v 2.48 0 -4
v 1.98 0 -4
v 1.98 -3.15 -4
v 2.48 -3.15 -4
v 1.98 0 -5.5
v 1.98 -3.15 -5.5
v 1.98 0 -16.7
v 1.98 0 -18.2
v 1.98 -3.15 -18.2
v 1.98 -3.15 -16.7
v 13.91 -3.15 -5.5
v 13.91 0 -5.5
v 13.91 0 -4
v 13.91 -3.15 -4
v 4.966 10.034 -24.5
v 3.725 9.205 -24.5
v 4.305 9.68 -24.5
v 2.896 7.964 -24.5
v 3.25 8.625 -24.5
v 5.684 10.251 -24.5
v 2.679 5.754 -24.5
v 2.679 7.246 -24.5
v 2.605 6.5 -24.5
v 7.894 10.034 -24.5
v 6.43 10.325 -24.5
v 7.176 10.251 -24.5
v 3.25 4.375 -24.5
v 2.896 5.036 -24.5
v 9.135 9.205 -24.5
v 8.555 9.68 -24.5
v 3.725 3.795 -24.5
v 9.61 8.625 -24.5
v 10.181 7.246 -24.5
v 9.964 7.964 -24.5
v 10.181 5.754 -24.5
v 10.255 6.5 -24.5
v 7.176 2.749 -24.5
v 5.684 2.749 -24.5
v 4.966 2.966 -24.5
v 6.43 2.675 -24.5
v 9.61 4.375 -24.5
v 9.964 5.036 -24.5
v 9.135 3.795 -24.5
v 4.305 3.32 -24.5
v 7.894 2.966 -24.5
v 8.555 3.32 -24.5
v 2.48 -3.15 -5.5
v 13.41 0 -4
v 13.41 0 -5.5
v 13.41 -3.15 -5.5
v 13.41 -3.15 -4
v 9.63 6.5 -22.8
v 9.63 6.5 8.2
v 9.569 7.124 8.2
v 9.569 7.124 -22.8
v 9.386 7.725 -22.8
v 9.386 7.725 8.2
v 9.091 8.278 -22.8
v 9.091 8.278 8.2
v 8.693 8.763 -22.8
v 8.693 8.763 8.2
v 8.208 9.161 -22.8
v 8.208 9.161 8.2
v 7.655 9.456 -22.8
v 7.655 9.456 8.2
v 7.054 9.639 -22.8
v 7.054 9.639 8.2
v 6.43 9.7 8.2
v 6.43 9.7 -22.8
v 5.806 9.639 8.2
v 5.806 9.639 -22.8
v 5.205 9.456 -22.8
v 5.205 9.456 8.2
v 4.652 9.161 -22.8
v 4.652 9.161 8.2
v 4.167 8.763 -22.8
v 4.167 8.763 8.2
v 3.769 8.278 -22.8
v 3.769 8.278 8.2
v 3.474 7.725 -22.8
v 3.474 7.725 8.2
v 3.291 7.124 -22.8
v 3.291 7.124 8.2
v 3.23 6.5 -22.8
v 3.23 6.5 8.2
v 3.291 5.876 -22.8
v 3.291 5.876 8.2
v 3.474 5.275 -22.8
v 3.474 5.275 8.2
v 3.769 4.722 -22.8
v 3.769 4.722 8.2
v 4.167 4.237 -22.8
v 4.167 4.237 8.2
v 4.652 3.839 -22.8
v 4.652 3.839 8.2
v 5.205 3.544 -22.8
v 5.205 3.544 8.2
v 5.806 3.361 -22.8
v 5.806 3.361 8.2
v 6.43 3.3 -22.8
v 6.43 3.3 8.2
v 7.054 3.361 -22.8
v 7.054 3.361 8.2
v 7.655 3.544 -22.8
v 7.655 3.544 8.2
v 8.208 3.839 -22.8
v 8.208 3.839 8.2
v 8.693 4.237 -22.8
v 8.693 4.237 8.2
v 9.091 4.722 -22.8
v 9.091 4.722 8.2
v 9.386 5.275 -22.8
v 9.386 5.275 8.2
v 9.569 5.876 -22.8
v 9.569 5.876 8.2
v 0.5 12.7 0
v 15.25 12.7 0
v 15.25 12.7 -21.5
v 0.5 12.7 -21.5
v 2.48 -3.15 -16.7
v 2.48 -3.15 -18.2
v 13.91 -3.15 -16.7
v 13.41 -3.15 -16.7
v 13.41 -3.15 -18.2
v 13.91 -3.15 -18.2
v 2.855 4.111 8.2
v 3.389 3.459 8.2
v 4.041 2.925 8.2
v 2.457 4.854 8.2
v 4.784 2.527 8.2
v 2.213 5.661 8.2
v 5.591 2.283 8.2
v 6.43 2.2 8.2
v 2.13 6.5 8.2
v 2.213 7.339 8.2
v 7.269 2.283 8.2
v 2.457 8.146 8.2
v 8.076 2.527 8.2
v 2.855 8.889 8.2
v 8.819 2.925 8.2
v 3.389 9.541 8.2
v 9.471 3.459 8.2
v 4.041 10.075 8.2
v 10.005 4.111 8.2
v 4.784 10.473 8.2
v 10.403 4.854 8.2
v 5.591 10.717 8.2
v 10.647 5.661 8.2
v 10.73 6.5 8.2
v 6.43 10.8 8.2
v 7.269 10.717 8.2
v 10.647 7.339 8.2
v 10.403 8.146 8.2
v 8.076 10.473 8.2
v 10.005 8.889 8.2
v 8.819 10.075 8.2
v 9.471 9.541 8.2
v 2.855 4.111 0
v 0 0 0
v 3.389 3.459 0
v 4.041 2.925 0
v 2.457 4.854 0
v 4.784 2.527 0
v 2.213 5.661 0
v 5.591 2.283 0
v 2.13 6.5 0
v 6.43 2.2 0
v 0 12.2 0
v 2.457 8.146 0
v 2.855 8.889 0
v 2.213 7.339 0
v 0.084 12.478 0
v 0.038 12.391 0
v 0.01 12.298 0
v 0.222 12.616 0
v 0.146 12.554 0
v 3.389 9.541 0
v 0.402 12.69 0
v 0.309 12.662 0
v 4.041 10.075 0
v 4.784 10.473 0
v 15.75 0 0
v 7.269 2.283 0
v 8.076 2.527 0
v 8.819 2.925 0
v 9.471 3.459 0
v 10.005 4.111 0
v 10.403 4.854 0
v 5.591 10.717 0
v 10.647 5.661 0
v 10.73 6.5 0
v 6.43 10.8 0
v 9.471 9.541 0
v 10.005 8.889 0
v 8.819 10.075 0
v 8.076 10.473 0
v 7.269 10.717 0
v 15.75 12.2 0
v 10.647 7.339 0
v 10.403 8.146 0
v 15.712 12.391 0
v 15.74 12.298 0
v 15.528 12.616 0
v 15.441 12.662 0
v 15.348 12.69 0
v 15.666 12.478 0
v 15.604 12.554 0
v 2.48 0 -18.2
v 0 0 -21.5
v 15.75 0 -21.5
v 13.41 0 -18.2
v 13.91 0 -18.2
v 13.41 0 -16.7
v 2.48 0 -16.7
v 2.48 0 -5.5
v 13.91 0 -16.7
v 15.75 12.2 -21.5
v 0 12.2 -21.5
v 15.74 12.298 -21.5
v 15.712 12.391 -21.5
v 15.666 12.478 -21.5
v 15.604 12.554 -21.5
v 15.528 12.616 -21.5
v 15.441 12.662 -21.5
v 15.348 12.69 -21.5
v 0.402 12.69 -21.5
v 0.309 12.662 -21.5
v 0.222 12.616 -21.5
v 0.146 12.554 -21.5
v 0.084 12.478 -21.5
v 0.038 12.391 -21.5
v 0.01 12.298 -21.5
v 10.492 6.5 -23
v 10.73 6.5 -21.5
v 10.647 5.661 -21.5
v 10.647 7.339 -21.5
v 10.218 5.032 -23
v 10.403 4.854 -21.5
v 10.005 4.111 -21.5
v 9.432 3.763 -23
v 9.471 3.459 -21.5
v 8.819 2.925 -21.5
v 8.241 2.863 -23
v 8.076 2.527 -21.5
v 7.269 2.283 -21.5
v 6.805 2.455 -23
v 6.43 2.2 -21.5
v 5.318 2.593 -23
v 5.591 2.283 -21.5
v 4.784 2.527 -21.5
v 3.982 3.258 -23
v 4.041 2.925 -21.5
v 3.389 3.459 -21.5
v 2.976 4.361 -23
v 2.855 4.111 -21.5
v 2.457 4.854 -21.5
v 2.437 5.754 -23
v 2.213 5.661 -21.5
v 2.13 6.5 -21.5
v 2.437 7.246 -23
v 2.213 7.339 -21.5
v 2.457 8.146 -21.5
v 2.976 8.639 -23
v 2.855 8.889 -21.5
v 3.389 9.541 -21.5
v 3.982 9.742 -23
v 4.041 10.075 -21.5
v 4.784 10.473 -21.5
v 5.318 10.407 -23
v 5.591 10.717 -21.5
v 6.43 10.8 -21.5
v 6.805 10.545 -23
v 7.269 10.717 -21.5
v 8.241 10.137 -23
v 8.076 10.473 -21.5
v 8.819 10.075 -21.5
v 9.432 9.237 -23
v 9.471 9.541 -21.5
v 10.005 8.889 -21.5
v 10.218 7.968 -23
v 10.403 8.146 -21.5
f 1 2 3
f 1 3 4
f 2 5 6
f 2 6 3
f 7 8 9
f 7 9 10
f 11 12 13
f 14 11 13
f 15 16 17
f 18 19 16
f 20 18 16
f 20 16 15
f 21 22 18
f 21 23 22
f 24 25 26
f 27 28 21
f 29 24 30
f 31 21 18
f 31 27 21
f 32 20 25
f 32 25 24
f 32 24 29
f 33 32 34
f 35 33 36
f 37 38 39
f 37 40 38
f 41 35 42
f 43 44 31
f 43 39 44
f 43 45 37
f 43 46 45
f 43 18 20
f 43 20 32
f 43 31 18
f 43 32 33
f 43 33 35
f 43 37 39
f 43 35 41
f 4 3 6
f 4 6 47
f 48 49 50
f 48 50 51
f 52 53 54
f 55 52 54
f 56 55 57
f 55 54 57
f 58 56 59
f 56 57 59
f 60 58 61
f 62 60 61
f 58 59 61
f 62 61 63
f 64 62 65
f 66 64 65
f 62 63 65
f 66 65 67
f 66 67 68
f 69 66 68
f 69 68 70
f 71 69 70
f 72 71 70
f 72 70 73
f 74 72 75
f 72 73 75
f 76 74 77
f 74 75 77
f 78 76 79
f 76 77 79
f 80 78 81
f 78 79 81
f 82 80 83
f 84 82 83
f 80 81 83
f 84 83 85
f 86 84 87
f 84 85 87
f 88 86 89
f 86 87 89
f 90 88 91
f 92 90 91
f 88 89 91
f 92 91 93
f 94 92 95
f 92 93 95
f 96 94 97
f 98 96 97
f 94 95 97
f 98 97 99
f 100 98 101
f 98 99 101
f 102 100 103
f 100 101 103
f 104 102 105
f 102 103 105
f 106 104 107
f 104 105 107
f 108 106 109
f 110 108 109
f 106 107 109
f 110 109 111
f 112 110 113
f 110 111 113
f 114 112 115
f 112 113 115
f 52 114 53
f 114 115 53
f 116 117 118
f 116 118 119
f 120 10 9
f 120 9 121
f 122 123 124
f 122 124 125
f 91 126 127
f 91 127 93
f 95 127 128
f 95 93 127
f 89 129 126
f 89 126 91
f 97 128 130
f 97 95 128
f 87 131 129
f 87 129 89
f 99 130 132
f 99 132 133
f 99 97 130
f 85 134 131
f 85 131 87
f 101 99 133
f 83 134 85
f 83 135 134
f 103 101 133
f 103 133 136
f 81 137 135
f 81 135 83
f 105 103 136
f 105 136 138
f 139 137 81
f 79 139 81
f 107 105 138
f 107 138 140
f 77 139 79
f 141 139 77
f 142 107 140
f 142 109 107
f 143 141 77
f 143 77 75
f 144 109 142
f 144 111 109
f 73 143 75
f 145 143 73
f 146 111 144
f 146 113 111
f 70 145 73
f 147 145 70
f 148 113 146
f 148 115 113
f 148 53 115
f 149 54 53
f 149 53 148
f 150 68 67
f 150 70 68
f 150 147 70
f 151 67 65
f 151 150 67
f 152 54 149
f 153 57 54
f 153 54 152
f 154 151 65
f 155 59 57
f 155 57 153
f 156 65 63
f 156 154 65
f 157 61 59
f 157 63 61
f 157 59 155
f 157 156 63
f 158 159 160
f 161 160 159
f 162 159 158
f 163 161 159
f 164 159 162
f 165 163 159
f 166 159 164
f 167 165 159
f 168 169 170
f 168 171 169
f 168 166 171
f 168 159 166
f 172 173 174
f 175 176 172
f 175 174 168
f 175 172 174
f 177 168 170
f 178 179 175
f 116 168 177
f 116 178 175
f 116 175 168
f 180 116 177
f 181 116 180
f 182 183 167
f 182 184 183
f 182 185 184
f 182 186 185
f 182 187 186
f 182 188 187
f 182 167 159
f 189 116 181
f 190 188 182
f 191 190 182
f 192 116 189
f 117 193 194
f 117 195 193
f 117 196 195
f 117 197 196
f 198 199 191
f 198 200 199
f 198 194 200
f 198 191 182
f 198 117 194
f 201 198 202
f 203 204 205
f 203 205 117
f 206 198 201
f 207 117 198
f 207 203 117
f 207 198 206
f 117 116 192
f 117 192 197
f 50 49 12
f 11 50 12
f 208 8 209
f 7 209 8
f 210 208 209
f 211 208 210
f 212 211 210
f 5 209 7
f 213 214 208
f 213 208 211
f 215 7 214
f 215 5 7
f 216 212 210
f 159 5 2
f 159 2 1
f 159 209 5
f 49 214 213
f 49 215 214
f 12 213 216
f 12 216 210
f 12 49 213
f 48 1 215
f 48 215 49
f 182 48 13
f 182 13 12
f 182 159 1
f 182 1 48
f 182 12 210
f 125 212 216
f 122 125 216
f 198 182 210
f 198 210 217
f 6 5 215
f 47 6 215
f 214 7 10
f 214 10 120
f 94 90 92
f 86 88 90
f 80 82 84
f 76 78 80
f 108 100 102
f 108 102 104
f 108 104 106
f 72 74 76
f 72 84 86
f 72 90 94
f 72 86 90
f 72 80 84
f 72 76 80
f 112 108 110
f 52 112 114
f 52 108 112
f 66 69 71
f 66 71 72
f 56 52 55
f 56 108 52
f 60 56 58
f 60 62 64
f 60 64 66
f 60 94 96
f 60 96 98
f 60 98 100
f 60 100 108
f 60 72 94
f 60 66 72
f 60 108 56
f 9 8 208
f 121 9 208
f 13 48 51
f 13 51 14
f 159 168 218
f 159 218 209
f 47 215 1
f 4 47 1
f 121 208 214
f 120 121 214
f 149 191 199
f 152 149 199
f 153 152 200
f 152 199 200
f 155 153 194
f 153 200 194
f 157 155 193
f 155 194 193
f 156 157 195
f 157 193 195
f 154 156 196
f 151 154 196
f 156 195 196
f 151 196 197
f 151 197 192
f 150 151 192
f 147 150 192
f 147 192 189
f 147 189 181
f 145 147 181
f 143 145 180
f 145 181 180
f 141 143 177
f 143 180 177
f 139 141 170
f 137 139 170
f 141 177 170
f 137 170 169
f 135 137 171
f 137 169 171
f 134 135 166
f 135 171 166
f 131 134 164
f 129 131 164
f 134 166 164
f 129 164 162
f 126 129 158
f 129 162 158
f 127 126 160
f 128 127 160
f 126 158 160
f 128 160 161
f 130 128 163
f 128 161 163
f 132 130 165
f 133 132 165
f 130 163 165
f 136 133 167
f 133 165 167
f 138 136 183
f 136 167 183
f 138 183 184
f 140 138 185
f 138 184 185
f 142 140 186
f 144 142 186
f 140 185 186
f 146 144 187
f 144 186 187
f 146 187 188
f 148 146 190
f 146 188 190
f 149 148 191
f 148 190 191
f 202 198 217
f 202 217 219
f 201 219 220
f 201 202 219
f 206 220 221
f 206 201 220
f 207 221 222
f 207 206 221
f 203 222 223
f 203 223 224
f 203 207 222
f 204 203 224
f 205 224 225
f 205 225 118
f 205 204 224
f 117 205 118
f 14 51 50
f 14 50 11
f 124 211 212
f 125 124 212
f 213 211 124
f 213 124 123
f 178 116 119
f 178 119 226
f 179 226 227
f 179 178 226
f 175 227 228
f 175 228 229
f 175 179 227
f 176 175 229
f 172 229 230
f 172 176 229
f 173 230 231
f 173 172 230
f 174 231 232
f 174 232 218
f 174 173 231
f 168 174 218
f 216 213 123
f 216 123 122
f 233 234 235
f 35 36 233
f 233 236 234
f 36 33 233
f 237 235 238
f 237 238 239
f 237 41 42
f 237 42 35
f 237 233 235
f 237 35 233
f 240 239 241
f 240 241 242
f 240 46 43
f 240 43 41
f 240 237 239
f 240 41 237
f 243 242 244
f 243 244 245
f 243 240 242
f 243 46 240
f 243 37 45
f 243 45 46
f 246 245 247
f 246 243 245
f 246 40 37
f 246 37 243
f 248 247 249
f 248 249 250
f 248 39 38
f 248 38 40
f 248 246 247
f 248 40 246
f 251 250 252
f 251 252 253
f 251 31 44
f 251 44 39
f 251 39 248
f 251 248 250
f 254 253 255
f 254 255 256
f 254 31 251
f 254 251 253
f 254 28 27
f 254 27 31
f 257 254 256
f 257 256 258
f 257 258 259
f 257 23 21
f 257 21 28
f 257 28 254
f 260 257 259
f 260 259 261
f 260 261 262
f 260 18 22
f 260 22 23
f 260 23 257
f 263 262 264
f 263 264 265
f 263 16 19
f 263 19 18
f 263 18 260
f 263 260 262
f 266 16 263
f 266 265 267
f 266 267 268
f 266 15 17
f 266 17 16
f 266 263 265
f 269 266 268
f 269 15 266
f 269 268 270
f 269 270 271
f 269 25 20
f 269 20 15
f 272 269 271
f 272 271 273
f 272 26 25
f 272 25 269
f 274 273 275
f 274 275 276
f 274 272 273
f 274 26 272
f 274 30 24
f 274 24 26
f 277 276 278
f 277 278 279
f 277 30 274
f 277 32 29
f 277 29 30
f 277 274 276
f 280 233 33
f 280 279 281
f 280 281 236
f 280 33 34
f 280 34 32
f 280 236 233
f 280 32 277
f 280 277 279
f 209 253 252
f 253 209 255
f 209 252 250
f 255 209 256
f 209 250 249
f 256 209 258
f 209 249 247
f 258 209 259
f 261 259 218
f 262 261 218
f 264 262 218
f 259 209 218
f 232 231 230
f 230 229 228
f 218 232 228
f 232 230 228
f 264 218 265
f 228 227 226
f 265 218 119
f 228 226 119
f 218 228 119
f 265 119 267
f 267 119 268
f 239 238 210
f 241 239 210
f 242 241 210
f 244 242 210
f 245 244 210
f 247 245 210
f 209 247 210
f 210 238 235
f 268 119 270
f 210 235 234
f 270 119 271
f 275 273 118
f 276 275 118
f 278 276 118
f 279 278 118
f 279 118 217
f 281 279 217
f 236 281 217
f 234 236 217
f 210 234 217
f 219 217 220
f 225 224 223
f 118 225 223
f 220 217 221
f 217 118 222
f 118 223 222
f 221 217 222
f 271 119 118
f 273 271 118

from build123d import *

# Parameters (mm, degrees)
BOSS_EXTRUDE1_DEPTH = 21.5
SKETCH2_R           = 4.3
BOSS_EXTRUDE2_DEPTH = 8.2
SKETCH8_R           = 4.3
BOSS_EXTRUDE3_DEPTH = 3
BOSS_EXTRUDE3_TAPER = 9
SKETCH7_R           = 3.2
CUT_EXTRUDE1_DEPTH  = 31
SKETCH9_W           = 0.5
SKETCH9_H           = 1.5
BOSS_EXTRUDE4_DEPTH = 3.15


with BuildPart() as part:
    # Sketch1 → Boss-Extrude1 (new body)
    with BuildSketch(Plane.XY):
        with BuildLine():
            Line((0, 0), (15.75, 0))
            Line((15.75, 0), (15.75, 12.2))
            ThreePointArc((15.75, 12.2), (15.603553391, 12.553553391), (15.25, 12.7))
            Line((15.25, 12.7), (0.5, 12.7))
            ThreePointArc((0.5, 12.7), (0.146446609, 12.553553391), (0, 12.2))
            Line((0, 12.2), (0, 0))
        make_face()
    extrude(amount=-BOSS_EXTRUDE1_DEPTH)

    # Sketch2 → Boss-Extrude2 (add)
    with BuildSketch(Plane.XY):
        with Locations((6.43, 6.5)):
            Circle(SKETCH2_R)
    extrude(amount=BOSS_EXTRUDE2_DEPTH)

    # Sketch8 → Boss-Extrude3 (add)
    with BuildSketch(Plane(origin=(0, 0, -21.5), x_dir=(-1, 0, 0), z_dir=(0, 0, -1))):
        with Locations(Location((-6.43, 6.5, 0), (0, 0, 180))):
            Circle(SKETCH8_R)
    extrude(amount=BOSS_EXTRUDE3_DEPTH, taper=BOSS_EXTRUDE3_TAPER)

    # Sketch7 → Cut-Extrude1 (cut)
    with BuildSketch(Plane.XY.offset(8.2)):
        with Locations((6.43, 6.5)):
            Circle(SKETCH7_R)
    extrude(amount=-CUT_EXTRUDE1_DEPTH, mode=Mode.SUBTRACT)

    # Sketch9 → Boss-Extrude4 (add)
    with BuildSketch(Plane.XZ):
        with Locations((2.23, -4.75)):
            Rectangle(SKETCH9_W, SKETCH9_H)
        with Locations((13.66, -4.75)):
            Rectangle(SKETCH9_W, SKETCH9_H)
        with Locations((2.23, -17.45)):
            Rectangle(SKETCH9_W, SKETCH9_H)
        with Locations((13.66, -17.45)):
            Rectangle(SKETCH9_W, SKETCH9_H)
    extrude(amount=BOSS_EXTRUDE4_DEPTH)


solid = part.part
